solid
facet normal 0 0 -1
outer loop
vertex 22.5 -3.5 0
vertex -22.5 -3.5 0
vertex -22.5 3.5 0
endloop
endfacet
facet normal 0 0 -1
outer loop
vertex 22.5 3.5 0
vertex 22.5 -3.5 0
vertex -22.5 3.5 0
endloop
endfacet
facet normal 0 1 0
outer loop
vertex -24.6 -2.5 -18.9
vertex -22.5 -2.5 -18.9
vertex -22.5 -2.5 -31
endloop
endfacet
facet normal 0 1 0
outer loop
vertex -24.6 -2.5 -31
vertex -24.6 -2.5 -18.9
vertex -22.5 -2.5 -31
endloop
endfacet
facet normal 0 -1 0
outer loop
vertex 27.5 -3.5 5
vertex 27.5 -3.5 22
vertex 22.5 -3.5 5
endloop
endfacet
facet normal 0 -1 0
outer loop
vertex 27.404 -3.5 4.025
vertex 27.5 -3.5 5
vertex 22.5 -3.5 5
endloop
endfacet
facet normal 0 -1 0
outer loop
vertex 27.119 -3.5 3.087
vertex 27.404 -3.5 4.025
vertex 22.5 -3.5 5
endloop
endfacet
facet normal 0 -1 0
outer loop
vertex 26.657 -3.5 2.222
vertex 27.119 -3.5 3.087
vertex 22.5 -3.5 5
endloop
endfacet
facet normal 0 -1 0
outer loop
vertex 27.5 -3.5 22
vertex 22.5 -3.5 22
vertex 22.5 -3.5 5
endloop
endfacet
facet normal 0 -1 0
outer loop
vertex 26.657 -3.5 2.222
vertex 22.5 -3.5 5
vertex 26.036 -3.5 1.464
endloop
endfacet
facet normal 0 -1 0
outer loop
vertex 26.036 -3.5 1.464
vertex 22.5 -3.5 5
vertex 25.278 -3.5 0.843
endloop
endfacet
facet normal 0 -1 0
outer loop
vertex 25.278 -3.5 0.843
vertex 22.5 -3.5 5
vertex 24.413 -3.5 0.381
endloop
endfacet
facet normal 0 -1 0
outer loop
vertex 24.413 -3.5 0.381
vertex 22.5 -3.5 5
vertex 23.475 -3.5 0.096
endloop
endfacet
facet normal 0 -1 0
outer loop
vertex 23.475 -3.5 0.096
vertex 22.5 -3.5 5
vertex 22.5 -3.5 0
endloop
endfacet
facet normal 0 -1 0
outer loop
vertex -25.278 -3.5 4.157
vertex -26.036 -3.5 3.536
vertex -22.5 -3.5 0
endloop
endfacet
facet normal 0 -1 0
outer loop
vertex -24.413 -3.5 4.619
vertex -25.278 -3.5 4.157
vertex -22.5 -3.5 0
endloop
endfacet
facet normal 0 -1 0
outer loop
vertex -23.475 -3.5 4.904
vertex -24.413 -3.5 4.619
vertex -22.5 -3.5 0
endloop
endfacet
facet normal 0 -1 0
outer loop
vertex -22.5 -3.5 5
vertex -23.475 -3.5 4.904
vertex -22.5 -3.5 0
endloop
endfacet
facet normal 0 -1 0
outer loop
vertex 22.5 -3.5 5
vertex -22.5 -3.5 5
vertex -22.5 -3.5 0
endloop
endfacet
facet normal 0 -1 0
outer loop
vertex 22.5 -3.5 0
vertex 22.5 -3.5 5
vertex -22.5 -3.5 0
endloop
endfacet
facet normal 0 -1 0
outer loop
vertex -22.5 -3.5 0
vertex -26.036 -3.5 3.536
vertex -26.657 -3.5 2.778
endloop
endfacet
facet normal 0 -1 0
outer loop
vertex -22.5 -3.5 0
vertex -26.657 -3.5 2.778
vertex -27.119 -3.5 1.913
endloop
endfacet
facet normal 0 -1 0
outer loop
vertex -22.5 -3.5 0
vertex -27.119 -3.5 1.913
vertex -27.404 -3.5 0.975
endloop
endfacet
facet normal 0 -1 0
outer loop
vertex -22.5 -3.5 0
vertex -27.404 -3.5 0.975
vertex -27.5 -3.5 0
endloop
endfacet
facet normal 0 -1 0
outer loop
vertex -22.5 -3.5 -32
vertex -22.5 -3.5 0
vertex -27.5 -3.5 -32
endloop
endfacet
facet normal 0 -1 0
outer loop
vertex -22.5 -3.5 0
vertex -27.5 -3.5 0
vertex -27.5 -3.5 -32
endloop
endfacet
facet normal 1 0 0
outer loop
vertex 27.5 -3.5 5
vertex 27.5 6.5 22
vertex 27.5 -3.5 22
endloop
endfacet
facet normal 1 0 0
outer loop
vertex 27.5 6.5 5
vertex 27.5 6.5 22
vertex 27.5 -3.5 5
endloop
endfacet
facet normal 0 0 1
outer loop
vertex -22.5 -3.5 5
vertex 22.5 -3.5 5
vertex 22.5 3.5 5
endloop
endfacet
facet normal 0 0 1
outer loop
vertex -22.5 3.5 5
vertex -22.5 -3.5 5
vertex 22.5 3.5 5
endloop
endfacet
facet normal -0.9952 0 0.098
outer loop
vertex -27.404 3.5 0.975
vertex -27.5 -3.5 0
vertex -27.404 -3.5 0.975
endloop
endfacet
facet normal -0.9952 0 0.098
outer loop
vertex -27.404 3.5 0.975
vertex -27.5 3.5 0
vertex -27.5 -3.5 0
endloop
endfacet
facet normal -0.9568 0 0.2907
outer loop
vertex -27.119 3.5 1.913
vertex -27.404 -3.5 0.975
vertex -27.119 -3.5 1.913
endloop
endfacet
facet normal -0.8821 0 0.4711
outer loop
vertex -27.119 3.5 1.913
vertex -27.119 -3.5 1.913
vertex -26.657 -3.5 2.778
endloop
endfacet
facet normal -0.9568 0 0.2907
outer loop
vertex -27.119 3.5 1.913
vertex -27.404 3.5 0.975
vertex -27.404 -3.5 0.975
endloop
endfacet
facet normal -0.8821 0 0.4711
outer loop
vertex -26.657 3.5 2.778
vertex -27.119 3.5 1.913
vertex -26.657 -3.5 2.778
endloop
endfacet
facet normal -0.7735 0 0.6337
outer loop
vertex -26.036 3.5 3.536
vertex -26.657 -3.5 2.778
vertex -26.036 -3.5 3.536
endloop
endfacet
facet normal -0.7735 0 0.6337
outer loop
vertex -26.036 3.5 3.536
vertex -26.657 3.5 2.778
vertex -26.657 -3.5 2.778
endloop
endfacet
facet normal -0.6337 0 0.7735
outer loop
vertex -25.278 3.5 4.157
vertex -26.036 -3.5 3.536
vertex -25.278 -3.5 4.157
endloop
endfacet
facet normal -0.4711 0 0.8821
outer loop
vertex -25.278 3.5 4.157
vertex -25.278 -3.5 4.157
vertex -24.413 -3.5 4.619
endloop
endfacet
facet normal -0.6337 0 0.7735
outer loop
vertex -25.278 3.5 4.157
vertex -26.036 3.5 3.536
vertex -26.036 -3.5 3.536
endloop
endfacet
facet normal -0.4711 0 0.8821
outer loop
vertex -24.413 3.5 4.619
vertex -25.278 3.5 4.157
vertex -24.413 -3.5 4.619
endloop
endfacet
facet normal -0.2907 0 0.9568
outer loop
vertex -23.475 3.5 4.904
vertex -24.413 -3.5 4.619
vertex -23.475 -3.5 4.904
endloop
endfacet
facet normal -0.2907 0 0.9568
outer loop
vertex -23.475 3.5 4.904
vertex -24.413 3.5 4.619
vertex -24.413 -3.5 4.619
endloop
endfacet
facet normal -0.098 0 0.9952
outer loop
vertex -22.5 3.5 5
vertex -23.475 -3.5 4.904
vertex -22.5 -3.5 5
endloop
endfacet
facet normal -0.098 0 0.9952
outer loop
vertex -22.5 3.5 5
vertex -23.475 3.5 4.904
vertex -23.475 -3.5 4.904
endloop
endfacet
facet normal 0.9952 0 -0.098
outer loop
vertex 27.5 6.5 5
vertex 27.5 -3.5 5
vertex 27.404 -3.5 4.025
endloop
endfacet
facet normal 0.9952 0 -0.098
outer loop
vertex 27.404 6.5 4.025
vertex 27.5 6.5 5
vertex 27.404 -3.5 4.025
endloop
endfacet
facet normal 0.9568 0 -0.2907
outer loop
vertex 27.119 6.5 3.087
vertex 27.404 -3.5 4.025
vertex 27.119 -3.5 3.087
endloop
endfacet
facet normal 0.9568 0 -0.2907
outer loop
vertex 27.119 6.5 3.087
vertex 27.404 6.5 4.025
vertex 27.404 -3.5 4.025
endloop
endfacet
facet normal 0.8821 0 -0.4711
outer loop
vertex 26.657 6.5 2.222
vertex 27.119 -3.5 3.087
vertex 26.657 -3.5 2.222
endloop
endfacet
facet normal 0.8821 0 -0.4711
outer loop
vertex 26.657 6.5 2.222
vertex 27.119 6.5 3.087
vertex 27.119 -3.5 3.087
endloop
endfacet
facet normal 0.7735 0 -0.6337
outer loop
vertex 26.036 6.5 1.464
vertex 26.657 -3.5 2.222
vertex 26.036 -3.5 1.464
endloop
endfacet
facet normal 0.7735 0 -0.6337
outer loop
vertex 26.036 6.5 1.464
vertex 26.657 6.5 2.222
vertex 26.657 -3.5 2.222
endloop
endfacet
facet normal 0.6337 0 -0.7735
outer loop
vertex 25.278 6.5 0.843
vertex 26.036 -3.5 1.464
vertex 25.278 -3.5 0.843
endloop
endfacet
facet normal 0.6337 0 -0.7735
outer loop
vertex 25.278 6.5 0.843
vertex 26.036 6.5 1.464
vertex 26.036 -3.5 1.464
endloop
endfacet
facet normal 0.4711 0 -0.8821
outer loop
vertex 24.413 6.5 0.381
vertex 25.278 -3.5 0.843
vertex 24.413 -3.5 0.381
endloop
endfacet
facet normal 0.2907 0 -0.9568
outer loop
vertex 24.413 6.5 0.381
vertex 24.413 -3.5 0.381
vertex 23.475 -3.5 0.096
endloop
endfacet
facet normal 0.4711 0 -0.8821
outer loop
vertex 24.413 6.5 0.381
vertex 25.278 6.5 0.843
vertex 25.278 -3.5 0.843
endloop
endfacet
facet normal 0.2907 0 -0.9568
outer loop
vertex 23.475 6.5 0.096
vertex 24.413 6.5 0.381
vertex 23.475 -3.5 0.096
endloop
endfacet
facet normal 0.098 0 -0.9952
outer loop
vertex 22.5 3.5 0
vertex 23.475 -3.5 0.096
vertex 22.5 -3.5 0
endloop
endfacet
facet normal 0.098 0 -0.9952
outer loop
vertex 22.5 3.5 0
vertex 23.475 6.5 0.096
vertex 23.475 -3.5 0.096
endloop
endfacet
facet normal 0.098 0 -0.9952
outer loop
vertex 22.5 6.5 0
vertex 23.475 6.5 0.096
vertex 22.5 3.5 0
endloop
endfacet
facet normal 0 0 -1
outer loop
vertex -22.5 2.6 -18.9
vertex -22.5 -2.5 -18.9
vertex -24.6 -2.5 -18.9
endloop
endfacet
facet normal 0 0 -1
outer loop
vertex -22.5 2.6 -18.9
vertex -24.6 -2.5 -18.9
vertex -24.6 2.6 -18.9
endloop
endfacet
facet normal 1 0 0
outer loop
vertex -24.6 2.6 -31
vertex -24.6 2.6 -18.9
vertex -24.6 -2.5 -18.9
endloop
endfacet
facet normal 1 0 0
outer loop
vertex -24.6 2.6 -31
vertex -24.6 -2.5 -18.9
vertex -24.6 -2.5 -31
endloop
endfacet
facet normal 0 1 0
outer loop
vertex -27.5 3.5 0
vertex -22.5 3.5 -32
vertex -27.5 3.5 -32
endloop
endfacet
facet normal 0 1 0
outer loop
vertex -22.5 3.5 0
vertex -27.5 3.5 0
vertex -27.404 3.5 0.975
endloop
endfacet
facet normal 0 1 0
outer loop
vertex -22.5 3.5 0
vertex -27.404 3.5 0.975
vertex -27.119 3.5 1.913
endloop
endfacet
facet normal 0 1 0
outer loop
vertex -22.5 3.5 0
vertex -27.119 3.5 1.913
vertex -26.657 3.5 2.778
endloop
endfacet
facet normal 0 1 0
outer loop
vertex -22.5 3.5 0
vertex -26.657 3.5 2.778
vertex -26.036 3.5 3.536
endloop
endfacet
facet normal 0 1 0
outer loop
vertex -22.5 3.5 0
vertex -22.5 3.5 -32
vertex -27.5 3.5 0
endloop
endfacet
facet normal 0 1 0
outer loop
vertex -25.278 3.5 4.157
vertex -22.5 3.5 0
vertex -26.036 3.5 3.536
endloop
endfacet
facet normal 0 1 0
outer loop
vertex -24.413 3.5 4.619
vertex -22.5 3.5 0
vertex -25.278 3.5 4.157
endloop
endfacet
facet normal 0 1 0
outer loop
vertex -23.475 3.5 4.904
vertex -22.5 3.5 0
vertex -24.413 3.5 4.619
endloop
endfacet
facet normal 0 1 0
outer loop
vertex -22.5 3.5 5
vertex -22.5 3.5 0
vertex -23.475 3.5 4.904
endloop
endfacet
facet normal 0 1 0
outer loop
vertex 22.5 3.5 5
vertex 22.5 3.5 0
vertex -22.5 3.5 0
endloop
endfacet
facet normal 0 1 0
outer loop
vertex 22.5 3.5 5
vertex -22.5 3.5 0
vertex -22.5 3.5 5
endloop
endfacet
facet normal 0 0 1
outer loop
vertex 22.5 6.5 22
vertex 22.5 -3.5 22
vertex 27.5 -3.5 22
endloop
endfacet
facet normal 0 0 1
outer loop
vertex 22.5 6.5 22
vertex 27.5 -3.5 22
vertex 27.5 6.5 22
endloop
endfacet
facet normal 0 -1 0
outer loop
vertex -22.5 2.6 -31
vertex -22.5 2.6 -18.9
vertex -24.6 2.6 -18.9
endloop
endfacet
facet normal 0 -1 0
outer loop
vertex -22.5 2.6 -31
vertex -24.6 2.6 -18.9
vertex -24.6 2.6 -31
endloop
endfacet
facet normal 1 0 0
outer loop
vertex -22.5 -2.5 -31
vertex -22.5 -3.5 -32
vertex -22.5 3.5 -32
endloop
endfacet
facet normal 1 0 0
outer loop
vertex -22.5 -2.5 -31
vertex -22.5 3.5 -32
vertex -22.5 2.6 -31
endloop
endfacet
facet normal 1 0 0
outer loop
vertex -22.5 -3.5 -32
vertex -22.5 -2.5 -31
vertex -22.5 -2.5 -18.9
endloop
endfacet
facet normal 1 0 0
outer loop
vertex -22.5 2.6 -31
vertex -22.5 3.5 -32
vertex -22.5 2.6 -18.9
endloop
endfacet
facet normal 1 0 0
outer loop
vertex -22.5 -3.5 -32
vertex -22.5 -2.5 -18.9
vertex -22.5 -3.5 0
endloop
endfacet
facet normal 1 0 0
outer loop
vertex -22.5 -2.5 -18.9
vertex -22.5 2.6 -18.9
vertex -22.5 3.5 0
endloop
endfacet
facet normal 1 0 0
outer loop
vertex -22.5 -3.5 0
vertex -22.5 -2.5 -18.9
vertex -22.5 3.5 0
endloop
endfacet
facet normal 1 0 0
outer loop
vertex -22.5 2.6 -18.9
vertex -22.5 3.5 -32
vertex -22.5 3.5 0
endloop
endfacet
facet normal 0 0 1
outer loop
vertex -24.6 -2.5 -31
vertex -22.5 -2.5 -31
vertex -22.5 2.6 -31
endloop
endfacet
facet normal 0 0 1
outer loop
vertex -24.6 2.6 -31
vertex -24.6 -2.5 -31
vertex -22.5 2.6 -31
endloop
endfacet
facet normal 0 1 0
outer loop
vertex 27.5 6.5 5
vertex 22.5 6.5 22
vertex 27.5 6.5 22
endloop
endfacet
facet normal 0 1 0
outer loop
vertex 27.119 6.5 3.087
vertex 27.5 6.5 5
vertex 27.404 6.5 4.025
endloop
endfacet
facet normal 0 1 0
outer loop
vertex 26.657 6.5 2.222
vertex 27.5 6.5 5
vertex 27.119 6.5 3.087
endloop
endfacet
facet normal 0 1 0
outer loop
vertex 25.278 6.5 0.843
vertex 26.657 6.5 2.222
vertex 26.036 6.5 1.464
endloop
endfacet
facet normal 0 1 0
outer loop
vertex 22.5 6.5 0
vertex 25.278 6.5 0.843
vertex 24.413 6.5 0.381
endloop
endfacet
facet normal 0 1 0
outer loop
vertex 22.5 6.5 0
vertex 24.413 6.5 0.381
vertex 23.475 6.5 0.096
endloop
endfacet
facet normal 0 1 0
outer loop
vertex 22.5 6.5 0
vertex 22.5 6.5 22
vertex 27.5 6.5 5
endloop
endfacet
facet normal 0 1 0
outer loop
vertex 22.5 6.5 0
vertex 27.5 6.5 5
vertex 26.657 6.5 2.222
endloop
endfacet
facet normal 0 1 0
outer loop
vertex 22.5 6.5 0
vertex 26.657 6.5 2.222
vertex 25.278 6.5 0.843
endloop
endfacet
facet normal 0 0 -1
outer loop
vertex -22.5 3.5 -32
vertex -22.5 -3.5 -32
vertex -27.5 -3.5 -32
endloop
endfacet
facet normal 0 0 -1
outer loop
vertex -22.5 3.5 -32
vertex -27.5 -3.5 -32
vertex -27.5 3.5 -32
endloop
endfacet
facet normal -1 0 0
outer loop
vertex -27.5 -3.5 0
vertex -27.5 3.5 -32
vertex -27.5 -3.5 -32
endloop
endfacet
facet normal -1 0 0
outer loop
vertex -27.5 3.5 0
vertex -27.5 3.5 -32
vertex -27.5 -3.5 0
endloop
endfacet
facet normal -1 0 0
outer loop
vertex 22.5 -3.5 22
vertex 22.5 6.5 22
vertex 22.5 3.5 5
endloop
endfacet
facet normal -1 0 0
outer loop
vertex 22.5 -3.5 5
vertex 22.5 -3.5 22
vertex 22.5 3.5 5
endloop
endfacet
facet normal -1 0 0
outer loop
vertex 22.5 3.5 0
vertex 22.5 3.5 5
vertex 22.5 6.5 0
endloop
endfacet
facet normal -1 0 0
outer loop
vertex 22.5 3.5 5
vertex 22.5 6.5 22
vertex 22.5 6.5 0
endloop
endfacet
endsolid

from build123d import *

# Parameters (mm, degrees)
SKETCH1_W           = 45
SKETCH1_H           = 7
BOSS_EXTRUDE1_DEPTH = 5
SKETCH2_W           = 37
SKETCH2_H           = 7
BOSS_EXTRUDE2_DEPTH = 5
FILLET1_R           = 5
SKETCH3_W           = 22
SKETCH3_H           = 10
BOSS_EXTRUDE3_DEPTH = 5
FILLET2_R           = 5
SKETCH4_W           = 12.1
SKETCH4_H           = 5.1
CUT_EXTRUDE1_DEPTH  = 2.1


with BuildPart() as part:
    # Sketch1 → Boss-Extrude1 (new body)
    with BuildSketch(Plane.XY):
        Rectangle(SKETCH1_W, SKETCH1_H)
    extrude(amount=BOSS_EXTRUDE1_DEPTH)

    # Sketch2 → Boss-Extrude2 (add)
    with BuildSketch(Plane.ZY.offset(22.5)):
        with Locations((-13.5, 0)):
            Rectangle(SKETCH2_W, SKETCH2_H)
    extrude(amount=BOSS_EXTRUDE2_DEPTH)

    # Fillet1
    fillet1_edges = [part.edges().sort_by_distance(p)[0] for p in [
        (-27.5, 0, 5),
    ]]
    fillet(fillet1_edges, radius=FILLET1_R)

    # Sketch3 → Boss-Extrude3 (add)
    with BuildSketch(Plane(origin=(22.5, 0, 0), x_dir=(0, 0, -1), z_dir=(1, 0, 0))):
        with Locations((-11, 1.5)):
            Rectangle(SKETCH3_W, SKETCH3_H)
    extrude(amount=BOSS_EXTRUDE3_DEPTH)

    # Fillet2
    fillet2_edges = [part.edges().sort_by_distance(p)[0] for p in [
        (27.5, 1.5, 0),
    ]]
    fillet(fillet2_edges, radius=FILLET2_R)

    # Sketch4 → Cut-Extrude1 (cut)
    with BuildSketch(Plane(origin=(-22.5, 0, 0), x_dir=(0, 0, -1), z_dir=(1, 0, 0))):
        with Locations((24.95, 0.05)):
            Rectangle(SKETCH4_W, SKETCH4_H)
    extrude(amount=-CUT_EXTRUDE1_DEPTH, mode=Mode.SUBTRACT)


solid = part.part
